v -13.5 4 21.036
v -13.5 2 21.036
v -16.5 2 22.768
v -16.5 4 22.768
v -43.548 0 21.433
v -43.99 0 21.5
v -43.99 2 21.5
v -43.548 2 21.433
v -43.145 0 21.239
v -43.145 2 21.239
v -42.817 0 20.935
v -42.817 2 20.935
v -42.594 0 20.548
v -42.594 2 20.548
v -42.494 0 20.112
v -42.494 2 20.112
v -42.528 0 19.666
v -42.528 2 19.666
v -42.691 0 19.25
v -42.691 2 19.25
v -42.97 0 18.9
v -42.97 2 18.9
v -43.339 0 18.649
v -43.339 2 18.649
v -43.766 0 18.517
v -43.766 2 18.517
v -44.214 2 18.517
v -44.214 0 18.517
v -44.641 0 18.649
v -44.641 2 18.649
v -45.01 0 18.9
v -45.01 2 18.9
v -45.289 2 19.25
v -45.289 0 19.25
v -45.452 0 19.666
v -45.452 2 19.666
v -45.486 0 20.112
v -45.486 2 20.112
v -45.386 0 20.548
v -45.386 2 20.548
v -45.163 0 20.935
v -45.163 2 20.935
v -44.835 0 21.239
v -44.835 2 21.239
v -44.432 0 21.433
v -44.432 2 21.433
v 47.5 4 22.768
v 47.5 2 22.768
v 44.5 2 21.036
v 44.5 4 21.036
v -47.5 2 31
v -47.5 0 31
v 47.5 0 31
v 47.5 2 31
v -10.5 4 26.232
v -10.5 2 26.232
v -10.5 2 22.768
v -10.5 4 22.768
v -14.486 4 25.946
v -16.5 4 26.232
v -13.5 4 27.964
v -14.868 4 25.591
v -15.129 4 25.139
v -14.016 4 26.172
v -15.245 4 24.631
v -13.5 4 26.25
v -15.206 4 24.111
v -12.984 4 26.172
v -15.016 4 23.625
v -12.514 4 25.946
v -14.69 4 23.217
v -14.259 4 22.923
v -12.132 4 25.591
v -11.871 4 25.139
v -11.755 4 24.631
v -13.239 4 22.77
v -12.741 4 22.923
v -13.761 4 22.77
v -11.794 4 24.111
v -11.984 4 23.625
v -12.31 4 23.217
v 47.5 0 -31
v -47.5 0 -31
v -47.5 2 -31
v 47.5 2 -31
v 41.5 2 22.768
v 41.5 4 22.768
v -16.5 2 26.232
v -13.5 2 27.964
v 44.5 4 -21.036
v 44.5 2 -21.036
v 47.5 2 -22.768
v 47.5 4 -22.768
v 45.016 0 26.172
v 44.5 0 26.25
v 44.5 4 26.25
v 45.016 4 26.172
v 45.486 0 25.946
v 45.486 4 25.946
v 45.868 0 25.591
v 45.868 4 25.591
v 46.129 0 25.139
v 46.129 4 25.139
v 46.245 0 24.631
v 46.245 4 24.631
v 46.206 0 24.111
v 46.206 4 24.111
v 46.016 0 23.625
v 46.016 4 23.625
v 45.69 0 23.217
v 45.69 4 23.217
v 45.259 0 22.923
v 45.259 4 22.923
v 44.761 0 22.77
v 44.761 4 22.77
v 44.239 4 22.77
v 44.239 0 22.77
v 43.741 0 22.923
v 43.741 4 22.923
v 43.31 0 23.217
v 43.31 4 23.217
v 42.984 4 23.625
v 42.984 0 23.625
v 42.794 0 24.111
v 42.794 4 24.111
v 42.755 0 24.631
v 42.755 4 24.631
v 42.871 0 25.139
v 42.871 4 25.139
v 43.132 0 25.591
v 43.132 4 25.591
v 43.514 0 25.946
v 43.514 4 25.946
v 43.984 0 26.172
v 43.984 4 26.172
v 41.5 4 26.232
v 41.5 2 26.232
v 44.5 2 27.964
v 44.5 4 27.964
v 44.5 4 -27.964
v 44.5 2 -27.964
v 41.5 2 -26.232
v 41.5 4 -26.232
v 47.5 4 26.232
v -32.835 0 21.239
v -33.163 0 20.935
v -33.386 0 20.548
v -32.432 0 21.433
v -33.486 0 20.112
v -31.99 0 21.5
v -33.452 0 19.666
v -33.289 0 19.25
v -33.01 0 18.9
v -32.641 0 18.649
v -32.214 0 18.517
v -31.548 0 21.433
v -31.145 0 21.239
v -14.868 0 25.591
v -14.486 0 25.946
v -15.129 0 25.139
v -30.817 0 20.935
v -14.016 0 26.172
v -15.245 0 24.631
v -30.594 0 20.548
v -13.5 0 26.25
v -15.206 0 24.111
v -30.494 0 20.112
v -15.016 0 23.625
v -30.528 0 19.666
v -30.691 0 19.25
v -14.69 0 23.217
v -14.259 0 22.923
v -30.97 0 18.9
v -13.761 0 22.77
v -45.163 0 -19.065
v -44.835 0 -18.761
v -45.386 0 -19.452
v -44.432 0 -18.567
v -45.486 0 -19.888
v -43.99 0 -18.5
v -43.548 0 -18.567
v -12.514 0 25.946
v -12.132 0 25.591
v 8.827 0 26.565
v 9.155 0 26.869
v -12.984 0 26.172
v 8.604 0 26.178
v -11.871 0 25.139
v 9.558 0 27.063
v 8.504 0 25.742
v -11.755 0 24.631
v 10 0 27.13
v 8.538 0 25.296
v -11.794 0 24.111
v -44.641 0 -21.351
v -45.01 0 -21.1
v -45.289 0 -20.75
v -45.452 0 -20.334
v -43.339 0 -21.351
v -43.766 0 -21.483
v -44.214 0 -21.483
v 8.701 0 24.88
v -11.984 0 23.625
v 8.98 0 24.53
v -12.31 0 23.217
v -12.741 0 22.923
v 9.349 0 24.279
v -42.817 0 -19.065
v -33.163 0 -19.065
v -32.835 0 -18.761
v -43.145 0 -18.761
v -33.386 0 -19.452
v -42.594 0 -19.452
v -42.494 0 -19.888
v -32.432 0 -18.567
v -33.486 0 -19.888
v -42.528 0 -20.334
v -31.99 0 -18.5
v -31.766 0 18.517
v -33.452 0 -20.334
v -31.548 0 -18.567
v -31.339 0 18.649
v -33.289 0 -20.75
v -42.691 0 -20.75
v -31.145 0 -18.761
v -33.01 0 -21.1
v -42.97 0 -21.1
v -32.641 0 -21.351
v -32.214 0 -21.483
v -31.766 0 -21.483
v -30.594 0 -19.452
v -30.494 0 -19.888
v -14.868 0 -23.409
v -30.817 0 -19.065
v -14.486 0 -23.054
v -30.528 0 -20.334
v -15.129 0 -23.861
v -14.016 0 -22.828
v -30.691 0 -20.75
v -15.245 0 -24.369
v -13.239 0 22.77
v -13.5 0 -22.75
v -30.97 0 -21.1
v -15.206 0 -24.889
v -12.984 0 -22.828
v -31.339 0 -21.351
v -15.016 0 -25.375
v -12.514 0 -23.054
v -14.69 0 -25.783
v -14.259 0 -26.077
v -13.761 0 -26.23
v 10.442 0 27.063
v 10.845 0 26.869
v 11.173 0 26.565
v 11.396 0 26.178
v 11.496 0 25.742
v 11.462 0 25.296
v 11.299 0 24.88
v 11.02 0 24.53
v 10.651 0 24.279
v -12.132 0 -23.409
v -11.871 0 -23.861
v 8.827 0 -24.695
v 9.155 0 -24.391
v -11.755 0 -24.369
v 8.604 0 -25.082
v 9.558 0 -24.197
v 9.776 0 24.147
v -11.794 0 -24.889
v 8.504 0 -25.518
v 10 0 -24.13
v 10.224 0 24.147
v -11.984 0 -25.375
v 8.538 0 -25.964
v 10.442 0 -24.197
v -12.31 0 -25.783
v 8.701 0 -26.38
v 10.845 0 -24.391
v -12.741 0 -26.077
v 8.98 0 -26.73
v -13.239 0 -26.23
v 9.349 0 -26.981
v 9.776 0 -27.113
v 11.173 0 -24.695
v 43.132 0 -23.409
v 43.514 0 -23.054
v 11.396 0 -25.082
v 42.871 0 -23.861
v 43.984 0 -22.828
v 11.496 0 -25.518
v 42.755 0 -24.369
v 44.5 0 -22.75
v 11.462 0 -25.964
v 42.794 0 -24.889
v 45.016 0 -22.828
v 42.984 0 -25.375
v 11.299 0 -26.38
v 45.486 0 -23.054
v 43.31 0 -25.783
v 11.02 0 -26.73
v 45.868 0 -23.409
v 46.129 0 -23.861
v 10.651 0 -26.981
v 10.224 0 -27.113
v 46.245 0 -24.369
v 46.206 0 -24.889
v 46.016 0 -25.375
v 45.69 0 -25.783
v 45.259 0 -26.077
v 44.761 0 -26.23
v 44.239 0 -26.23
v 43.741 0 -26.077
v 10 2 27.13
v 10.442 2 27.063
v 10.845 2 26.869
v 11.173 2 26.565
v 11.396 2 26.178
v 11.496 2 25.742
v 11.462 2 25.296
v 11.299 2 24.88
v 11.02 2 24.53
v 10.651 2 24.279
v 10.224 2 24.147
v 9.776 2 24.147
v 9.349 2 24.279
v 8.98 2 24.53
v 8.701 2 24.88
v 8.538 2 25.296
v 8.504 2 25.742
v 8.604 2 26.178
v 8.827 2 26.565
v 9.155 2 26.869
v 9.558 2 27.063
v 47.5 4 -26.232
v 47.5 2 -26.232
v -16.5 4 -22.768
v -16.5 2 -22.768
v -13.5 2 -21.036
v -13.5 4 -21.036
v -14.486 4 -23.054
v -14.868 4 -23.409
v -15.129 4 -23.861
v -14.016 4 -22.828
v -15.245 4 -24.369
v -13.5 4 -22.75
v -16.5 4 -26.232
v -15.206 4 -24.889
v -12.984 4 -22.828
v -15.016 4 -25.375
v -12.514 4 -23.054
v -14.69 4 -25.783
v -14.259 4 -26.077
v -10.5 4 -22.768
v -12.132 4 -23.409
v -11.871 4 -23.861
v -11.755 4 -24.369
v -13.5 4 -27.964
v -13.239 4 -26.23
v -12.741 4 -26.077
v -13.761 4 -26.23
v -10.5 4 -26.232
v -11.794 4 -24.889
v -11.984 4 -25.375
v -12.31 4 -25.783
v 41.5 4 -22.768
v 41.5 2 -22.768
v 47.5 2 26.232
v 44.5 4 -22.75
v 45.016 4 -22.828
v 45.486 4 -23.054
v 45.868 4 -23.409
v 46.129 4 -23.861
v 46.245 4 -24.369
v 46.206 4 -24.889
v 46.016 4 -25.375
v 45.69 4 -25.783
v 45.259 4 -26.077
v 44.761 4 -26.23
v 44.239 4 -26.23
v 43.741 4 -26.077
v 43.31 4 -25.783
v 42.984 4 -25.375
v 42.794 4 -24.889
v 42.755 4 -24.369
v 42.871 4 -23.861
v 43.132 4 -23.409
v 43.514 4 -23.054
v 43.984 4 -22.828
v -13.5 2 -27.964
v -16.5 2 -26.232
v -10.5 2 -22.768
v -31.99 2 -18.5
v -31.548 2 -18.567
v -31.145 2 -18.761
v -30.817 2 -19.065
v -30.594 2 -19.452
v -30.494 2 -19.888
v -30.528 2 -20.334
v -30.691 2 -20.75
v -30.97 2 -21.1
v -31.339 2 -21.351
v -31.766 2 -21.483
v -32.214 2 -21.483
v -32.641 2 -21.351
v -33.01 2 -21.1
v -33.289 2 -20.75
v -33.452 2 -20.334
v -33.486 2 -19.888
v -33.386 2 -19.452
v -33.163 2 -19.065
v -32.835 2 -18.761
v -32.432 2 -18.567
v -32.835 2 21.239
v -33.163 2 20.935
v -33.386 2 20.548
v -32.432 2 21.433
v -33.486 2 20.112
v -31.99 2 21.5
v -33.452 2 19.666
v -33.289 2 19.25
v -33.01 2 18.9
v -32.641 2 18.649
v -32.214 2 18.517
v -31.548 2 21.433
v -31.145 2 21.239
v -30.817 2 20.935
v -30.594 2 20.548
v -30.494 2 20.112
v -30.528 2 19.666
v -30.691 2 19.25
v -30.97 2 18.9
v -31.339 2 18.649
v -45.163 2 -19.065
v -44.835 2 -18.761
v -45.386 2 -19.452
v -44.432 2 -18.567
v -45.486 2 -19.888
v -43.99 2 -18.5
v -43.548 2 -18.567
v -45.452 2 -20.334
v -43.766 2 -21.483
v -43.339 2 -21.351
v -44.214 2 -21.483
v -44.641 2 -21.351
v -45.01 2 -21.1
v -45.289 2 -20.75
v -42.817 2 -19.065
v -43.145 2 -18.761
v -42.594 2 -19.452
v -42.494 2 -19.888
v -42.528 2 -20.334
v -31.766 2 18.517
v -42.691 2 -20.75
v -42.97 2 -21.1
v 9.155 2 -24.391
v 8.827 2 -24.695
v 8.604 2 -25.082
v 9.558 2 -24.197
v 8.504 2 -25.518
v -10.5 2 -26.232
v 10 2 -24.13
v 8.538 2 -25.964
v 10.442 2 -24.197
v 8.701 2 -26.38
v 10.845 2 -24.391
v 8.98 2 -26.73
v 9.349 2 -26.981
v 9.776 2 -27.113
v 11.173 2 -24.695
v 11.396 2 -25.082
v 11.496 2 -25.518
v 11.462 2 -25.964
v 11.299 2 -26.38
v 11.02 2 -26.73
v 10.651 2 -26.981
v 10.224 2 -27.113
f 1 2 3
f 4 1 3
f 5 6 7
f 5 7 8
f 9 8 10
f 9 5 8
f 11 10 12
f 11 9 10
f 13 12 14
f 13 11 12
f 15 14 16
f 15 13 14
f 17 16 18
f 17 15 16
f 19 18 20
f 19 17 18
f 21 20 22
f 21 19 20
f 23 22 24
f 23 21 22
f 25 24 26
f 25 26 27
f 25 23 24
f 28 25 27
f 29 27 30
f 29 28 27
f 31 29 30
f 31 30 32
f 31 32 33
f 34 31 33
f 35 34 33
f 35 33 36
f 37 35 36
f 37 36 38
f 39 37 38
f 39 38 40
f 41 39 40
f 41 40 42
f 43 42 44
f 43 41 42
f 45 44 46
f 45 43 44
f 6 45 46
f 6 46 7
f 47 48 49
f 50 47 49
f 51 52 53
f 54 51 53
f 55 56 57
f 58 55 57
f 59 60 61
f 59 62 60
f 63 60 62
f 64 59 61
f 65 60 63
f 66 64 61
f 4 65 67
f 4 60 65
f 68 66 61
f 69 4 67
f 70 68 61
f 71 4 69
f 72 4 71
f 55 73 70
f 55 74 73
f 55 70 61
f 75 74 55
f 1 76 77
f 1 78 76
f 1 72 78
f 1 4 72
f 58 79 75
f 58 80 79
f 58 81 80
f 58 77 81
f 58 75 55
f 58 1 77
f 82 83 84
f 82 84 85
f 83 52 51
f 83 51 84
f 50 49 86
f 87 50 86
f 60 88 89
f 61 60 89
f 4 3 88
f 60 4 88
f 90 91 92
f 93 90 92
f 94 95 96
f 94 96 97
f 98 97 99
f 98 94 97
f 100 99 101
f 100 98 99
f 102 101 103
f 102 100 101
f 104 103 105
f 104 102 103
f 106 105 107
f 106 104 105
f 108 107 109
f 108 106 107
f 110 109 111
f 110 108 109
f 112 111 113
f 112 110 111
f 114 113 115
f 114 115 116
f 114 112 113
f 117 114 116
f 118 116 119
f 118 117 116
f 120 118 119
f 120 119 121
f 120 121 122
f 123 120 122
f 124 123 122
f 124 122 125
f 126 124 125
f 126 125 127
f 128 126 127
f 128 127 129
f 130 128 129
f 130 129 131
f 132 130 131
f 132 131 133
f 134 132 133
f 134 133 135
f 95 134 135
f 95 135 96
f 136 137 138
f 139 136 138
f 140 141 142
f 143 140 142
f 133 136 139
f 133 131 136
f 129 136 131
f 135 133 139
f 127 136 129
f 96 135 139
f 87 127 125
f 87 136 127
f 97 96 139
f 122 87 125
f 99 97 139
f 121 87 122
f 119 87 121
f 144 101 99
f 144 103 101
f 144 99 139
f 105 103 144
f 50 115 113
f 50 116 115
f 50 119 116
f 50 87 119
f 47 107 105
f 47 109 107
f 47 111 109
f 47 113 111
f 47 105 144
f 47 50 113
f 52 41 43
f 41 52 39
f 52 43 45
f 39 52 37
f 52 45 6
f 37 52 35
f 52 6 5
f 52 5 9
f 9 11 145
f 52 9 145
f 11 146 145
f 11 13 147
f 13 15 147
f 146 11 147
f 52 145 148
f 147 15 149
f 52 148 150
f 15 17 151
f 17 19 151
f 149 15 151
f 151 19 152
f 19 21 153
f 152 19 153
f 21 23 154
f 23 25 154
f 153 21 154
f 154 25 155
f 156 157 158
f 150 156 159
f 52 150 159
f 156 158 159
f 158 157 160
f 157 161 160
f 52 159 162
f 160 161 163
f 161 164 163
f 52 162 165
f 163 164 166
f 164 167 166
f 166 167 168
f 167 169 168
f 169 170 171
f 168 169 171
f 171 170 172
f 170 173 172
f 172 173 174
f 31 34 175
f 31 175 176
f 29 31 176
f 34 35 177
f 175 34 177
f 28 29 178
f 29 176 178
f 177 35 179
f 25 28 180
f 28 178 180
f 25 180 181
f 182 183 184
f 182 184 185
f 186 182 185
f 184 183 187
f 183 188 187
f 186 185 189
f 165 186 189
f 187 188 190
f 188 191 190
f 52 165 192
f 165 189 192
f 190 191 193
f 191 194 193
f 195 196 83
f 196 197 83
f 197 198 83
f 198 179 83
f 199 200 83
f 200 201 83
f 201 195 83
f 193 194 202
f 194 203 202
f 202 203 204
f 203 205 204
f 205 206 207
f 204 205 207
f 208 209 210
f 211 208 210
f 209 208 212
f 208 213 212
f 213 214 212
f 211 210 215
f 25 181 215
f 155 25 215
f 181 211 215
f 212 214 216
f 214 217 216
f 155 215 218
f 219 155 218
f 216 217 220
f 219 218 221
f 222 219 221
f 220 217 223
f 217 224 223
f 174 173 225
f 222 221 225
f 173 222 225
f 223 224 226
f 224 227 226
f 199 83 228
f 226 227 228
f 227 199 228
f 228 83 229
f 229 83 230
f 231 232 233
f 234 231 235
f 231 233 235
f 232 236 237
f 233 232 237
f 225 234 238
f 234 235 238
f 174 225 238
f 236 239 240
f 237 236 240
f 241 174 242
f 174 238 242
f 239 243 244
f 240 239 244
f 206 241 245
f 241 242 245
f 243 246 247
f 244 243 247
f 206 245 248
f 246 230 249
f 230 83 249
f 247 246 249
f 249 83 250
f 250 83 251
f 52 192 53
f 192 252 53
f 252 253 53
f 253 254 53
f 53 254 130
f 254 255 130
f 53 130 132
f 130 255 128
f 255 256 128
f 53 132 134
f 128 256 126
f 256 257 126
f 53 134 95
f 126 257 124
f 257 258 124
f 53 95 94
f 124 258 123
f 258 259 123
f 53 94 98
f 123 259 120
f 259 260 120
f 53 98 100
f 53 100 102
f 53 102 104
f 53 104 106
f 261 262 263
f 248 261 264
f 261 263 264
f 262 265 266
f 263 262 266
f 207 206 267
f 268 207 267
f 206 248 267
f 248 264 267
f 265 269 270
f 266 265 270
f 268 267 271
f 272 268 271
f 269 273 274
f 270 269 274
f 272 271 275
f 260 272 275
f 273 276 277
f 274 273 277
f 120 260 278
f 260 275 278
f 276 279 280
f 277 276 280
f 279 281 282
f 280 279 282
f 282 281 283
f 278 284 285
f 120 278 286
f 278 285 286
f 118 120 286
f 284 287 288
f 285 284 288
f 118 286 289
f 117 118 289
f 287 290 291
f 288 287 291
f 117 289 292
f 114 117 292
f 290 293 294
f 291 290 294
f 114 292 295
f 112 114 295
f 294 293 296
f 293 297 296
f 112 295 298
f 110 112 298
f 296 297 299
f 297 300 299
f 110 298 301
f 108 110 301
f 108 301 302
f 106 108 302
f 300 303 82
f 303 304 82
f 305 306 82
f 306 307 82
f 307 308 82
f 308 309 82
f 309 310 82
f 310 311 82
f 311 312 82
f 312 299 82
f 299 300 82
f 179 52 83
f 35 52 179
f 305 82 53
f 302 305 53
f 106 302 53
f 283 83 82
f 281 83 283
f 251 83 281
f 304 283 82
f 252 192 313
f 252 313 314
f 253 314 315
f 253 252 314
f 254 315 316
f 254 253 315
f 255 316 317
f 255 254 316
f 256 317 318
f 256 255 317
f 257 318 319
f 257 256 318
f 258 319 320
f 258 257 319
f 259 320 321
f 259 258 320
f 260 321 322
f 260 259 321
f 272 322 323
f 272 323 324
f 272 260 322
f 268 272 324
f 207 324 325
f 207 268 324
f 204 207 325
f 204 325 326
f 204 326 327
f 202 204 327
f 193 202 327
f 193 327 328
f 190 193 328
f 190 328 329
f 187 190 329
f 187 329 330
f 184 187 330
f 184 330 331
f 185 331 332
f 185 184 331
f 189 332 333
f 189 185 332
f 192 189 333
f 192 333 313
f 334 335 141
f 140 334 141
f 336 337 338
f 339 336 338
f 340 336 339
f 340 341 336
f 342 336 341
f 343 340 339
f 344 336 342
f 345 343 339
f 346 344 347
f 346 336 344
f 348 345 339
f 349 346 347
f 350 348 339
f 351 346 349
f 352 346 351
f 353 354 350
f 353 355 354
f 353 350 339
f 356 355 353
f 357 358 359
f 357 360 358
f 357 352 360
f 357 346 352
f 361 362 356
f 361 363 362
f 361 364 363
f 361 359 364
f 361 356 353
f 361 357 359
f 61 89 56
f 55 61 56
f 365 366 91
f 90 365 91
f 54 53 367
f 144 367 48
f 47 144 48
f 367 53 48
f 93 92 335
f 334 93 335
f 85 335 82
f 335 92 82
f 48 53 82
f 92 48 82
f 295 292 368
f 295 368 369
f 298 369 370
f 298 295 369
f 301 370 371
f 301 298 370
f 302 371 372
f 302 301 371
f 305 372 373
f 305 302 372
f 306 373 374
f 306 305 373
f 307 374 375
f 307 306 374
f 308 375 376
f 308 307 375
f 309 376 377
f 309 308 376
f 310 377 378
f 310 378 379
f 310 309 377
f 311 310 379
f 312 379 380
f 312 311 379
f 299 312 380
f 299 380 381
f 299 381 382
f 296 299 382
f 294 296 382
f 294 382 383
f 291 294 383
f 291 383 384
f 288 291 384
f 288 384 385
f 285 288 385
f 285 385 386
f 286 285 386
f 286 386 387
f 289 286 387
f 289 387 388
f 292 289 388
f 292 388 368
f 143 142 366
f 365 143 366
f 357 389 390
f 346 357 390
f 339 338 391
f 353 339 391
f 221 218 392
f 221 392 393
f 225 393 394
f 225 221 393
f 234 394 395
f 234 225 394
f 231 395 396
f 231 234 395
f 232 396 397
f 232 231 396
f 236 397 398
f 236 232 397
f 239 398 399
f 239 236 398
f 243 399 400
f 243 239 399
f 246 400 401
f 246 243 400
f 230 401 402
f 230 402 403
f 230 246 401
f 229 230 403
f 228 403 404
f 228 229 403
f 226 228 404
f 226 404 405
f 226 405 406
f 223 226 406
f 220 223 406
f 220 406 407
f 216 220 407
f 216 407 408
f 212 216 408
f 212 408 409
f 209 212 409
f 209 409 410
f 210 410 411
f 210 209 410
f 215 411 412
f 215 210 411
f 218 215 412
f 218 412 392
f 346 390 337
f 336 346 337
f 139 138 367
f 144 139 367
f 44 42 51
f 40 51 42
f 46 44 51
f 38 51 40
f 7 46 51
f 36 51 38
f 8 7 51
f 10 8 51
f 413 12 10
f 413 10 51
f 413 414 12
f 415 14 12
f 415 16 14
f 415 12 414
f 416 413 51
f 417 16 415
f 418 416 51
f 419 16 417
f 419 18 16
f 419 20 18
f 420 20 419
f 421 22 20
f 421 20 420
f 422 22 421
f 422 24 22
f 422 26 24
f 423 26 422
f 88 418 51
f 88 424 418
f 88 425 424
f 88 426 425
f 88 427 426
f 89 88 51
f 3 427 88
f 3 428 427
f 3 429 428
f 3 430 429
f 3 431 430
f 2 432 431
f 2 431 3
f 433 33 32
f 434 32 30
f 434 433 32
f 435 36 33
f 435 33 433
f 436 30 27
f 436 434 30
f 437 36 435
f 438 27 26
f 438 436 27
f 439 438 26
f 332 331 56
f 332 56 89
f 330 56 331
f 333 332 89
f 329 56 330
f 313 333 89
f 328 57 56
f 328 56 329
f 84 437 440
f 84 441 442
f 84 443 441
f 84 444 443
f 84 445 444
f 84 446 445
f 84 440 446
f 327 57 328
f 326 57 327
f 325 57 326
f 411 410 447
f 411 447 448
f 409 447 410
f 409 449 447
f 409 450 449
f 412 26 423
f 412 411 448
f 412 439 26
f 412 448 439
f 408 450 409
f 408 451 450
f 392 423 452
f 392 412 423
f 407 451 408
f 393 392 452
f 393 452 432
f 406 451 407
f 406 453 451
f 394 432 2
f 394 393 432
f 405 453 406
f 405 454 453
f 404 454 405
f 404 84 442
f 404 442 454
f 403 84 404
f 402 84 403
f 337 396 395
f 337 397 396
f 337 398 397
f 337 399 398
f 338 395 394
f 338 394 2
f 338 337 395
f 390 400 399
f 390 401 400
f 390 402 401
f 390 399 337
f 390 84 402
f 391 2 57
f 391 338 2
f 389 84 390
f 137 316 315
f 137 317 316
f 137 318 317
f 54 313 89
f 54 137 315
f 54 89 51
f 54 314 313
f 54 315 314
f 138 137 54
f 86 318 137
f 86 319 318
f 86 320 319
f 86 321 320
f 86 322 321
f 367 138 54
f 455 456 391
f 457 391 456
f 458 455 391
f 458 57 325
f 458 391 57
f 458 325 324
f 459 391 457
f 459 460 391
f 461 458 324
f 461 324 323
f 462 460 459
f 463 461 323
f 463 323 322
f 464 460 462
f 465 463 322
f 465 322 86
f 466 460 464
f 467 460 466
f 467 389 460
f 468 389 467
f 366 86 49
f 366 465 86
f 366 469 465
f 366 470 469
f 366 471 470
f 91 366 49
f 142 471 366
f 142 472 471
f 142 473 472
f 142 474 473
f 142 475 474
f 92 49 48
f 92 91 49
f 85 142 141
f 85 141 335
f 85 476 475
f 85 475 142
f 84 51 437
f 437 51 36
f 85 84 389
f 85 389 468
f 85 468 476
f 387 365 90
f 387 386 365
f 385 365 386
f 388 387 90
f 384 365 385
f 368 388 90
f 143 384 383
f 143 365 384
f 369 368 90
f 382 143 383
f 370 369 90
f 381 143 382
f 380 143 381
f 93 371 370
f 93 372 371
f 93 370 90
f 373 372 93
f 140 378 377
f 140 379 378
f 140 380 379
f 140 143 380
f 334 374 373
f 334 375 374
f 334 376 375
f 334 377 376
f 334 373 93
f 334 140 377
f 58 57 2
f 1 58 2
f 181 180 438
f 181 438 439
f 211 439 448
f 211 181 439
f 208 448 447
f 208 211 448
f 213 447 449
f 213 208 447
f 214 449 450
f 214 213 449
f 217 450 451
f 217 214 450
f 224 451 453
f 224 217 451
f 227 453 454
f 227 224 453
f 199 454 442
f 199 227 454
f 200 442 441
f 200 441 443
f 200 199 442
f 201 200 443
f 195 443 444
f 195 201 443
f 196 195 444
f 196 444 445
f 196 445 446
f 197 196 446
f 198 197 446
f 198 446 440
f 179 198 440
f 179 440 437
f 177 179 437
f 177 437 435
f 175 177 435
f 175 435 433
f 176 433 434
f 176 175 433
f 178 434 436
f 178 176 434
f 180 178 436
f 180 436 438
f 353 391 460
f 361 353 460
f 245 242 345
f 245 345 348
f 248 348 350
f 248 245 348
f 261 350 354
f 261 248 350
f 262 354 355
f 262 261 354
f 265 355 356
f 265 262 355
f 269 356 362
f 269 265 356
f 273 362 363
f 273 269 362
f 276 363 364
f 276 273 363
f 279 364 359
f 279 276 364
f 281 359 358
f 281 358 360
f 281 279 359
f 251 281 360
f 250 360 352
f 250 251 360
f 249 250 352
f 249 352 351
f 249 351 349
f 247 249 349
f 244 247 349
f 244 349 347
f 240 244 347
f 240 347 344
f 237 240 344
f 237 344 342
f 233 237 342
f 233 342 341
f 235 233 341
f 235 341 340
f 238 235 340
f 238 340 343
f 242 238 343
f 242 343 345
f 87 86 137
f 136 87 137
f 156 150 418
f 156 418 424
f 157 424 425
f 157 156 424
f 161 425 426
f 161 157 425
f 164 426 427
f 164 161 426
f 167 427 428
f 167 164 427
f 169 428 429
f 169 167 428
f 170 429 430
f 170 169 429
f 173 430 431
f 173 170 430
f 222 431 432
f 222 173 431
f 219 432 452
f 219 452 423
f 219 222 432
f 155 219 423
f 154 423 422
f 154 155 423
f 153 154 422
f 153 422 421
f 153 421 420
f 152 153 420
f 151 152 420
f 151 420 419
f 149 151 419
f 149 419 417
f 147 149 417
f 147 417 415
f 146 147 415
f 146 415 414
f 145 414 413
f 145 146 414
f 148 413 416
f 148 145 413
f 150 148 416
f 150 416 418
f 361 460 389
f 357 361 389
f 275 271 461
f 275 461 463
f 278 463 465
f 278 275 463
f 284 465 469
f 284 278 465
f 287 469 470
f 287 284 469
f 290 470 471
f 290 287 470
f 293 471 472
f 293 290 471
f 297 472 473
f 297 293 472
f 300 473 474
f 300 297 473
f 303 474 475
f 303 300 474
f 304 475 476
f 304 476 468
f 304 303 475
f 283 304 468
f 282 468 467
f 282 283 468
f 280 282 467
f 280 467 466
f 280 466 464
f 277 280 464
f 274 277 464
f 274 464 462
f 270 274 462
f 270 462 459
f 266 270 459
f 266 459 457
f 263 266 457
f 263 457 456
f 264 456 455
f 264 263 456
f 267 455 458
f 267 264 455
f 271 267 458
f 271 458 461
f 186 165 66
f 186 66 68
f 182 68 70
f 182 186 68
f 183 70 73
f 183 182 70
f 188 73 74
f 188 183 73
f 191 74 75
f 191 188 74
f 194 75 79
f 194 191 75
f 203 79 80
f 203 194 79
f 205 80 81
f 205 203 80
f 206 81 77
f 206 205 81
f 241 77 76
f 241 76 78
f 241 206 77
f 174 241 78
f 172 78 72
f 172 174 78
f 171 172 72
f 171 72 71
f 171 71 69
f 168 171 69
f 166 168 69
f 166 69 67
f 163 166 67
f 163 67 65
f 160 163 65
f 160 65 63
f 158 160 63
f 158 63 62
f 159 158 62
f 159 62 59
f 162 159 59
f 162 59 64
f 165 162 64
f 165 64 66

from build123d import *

# Parameters (mm, degrees)
CROQUIS1_W              = 95
CROQUIS1_H              = 62
CROQUIS1_R              = 1.5
CROQUIS1_R_2            = 1.75
SALIENTE_EXTRUIR1_DEPTH = 2
CROQUIS1_4_R            = 1.75
SALIENTE_EXTRUIR2_DEPTH = 4


with BuildPart() as part:
    # Croquis1 → Saliente-Extruir1 (new body)
    with BuildSketch(Plane(origin=(0, 0, 0), x_dir=(1, 0, 0), z_dir=(0, 1, 0))):
        Rectangle(CROQUIS1_W, CROQUIS1_H)
        with Locations((-43.99, -20)):
            Circle(CROQUIS1_R, mode=Mode.SUBTRACT)
        with Locations((-31.99, -20)):
            Circle(CROQUIS1_R, mode=Mode.SUBTRACT)
        with Locations((10, -25.63)):
            Circle(CROQUIS1_R, mode=Mode.SUBTRACT)
        with Locations((-43.99, 20)):
            Circle(CROQUIS1_R, mode=Mode.SUBTRACT)
        with Locations((-31.99, 20)):
            Circle(CROQUIS1_R, mode=Mode.SUBTRACT)
        with Locations((10, 25.63)):
            Circle(CROQUIS1_R, mode=Mode.SUBTRACT)
        with Locations((44.5, 24.5)):
            Circle(CROQUIS1_R_2, mode=Mode.SUBTRACT)
        with Locations((44.5, -24.5)):
            Circle(CROQUIS1_R_2, mode=Mode.SUBTRACT)
        with Locations((-13.5, -24.5)):
            Circle(CROQUIS1_R_2, mode=Mode.SUBTRACT)
        with Locations((-13.5, 24.5)):
            Circle(CROQUIS1_R_2, mode=Mode.SUBTRACT)
    extrude(amount=SALIENTE_EXTRUIR1_DEPTH)

    # Croquis1<4> → Saliente-Extruir2 (add)
    # profile 1 of 4: a face of its own
    with BuildSketch(Plane(origin=(0, 0, 0), x_dir=(1, 0, 0), z_dir=(0, 1, 0))):
        Polygon((47.5, 22.767949192), (47.5, 26.232050808), (44.5, 27.964101615), (41.5, 26.232050808), (41.5, 22.767949192), (44.5, 21.035898385), align=None)
        with Locations((44.5, 24.5)):
            Circle(CROQUIS1_4_R, mode=Mode.SUBTRACT)
    # profile 2 of 4: a face of its own
    with BuildSketch(Plane(origin=(0, 0, 0), x_dir=(1, 0, 0), z_dir=(0, 1, 0))):
        Polygon((44.5, -27.964101615), (47.5, -26.232050808), (47.5, -22.767949192), (44.5, -21.035898385), (41.5, -22.767949192), (41.5, -26.232050808), align=None)
        with Locations((44.5, -24.5)):
            Circle(CROQUIS1_4_R, mode=Mode.SUBTRACT)
    # profile 3 of 4: a face of its own
    with BuildSketch(Plane(origin=(0, 0, 0), x_dir=(1, 0, 0), z_dir=(0, 1, 0))):
        Polygon((-13.5, 21.035898385), (-10.5, 22.767949192), (-10.5, 26.232050808), (-13.5, 27.964101615), (-16.5, 26.232050808), (-16.5, 22.767949192), align=None)
        with Locations((-13.5, 24.5)):
            Circle(CROQUIS1_4_R, mode=Mode.SUBTRACT)
    # profile 4 of 4: a face of its own
    with BuildSketch(Plane(origin=(0, 0, 0), x_dir=(1, 0, 0), z_dir=(0, 1, 0))):
        Polygon((-13.5, -27.964101615), (-10.5, -26.232050808), (-10.5, -22.767949192), (-13.5, -21.035898385), (-16.5, -22.767949192), (-16.5, -26.232050808), align=None)
        with Locations((-13.5, -24.5)):
            Circle(CROQUIS1_4_R, mode=Mode.SUBTRACT)
    extrude(amount=SALIENTE_EXTRUIR2_DEPTH)


solid = part.part
